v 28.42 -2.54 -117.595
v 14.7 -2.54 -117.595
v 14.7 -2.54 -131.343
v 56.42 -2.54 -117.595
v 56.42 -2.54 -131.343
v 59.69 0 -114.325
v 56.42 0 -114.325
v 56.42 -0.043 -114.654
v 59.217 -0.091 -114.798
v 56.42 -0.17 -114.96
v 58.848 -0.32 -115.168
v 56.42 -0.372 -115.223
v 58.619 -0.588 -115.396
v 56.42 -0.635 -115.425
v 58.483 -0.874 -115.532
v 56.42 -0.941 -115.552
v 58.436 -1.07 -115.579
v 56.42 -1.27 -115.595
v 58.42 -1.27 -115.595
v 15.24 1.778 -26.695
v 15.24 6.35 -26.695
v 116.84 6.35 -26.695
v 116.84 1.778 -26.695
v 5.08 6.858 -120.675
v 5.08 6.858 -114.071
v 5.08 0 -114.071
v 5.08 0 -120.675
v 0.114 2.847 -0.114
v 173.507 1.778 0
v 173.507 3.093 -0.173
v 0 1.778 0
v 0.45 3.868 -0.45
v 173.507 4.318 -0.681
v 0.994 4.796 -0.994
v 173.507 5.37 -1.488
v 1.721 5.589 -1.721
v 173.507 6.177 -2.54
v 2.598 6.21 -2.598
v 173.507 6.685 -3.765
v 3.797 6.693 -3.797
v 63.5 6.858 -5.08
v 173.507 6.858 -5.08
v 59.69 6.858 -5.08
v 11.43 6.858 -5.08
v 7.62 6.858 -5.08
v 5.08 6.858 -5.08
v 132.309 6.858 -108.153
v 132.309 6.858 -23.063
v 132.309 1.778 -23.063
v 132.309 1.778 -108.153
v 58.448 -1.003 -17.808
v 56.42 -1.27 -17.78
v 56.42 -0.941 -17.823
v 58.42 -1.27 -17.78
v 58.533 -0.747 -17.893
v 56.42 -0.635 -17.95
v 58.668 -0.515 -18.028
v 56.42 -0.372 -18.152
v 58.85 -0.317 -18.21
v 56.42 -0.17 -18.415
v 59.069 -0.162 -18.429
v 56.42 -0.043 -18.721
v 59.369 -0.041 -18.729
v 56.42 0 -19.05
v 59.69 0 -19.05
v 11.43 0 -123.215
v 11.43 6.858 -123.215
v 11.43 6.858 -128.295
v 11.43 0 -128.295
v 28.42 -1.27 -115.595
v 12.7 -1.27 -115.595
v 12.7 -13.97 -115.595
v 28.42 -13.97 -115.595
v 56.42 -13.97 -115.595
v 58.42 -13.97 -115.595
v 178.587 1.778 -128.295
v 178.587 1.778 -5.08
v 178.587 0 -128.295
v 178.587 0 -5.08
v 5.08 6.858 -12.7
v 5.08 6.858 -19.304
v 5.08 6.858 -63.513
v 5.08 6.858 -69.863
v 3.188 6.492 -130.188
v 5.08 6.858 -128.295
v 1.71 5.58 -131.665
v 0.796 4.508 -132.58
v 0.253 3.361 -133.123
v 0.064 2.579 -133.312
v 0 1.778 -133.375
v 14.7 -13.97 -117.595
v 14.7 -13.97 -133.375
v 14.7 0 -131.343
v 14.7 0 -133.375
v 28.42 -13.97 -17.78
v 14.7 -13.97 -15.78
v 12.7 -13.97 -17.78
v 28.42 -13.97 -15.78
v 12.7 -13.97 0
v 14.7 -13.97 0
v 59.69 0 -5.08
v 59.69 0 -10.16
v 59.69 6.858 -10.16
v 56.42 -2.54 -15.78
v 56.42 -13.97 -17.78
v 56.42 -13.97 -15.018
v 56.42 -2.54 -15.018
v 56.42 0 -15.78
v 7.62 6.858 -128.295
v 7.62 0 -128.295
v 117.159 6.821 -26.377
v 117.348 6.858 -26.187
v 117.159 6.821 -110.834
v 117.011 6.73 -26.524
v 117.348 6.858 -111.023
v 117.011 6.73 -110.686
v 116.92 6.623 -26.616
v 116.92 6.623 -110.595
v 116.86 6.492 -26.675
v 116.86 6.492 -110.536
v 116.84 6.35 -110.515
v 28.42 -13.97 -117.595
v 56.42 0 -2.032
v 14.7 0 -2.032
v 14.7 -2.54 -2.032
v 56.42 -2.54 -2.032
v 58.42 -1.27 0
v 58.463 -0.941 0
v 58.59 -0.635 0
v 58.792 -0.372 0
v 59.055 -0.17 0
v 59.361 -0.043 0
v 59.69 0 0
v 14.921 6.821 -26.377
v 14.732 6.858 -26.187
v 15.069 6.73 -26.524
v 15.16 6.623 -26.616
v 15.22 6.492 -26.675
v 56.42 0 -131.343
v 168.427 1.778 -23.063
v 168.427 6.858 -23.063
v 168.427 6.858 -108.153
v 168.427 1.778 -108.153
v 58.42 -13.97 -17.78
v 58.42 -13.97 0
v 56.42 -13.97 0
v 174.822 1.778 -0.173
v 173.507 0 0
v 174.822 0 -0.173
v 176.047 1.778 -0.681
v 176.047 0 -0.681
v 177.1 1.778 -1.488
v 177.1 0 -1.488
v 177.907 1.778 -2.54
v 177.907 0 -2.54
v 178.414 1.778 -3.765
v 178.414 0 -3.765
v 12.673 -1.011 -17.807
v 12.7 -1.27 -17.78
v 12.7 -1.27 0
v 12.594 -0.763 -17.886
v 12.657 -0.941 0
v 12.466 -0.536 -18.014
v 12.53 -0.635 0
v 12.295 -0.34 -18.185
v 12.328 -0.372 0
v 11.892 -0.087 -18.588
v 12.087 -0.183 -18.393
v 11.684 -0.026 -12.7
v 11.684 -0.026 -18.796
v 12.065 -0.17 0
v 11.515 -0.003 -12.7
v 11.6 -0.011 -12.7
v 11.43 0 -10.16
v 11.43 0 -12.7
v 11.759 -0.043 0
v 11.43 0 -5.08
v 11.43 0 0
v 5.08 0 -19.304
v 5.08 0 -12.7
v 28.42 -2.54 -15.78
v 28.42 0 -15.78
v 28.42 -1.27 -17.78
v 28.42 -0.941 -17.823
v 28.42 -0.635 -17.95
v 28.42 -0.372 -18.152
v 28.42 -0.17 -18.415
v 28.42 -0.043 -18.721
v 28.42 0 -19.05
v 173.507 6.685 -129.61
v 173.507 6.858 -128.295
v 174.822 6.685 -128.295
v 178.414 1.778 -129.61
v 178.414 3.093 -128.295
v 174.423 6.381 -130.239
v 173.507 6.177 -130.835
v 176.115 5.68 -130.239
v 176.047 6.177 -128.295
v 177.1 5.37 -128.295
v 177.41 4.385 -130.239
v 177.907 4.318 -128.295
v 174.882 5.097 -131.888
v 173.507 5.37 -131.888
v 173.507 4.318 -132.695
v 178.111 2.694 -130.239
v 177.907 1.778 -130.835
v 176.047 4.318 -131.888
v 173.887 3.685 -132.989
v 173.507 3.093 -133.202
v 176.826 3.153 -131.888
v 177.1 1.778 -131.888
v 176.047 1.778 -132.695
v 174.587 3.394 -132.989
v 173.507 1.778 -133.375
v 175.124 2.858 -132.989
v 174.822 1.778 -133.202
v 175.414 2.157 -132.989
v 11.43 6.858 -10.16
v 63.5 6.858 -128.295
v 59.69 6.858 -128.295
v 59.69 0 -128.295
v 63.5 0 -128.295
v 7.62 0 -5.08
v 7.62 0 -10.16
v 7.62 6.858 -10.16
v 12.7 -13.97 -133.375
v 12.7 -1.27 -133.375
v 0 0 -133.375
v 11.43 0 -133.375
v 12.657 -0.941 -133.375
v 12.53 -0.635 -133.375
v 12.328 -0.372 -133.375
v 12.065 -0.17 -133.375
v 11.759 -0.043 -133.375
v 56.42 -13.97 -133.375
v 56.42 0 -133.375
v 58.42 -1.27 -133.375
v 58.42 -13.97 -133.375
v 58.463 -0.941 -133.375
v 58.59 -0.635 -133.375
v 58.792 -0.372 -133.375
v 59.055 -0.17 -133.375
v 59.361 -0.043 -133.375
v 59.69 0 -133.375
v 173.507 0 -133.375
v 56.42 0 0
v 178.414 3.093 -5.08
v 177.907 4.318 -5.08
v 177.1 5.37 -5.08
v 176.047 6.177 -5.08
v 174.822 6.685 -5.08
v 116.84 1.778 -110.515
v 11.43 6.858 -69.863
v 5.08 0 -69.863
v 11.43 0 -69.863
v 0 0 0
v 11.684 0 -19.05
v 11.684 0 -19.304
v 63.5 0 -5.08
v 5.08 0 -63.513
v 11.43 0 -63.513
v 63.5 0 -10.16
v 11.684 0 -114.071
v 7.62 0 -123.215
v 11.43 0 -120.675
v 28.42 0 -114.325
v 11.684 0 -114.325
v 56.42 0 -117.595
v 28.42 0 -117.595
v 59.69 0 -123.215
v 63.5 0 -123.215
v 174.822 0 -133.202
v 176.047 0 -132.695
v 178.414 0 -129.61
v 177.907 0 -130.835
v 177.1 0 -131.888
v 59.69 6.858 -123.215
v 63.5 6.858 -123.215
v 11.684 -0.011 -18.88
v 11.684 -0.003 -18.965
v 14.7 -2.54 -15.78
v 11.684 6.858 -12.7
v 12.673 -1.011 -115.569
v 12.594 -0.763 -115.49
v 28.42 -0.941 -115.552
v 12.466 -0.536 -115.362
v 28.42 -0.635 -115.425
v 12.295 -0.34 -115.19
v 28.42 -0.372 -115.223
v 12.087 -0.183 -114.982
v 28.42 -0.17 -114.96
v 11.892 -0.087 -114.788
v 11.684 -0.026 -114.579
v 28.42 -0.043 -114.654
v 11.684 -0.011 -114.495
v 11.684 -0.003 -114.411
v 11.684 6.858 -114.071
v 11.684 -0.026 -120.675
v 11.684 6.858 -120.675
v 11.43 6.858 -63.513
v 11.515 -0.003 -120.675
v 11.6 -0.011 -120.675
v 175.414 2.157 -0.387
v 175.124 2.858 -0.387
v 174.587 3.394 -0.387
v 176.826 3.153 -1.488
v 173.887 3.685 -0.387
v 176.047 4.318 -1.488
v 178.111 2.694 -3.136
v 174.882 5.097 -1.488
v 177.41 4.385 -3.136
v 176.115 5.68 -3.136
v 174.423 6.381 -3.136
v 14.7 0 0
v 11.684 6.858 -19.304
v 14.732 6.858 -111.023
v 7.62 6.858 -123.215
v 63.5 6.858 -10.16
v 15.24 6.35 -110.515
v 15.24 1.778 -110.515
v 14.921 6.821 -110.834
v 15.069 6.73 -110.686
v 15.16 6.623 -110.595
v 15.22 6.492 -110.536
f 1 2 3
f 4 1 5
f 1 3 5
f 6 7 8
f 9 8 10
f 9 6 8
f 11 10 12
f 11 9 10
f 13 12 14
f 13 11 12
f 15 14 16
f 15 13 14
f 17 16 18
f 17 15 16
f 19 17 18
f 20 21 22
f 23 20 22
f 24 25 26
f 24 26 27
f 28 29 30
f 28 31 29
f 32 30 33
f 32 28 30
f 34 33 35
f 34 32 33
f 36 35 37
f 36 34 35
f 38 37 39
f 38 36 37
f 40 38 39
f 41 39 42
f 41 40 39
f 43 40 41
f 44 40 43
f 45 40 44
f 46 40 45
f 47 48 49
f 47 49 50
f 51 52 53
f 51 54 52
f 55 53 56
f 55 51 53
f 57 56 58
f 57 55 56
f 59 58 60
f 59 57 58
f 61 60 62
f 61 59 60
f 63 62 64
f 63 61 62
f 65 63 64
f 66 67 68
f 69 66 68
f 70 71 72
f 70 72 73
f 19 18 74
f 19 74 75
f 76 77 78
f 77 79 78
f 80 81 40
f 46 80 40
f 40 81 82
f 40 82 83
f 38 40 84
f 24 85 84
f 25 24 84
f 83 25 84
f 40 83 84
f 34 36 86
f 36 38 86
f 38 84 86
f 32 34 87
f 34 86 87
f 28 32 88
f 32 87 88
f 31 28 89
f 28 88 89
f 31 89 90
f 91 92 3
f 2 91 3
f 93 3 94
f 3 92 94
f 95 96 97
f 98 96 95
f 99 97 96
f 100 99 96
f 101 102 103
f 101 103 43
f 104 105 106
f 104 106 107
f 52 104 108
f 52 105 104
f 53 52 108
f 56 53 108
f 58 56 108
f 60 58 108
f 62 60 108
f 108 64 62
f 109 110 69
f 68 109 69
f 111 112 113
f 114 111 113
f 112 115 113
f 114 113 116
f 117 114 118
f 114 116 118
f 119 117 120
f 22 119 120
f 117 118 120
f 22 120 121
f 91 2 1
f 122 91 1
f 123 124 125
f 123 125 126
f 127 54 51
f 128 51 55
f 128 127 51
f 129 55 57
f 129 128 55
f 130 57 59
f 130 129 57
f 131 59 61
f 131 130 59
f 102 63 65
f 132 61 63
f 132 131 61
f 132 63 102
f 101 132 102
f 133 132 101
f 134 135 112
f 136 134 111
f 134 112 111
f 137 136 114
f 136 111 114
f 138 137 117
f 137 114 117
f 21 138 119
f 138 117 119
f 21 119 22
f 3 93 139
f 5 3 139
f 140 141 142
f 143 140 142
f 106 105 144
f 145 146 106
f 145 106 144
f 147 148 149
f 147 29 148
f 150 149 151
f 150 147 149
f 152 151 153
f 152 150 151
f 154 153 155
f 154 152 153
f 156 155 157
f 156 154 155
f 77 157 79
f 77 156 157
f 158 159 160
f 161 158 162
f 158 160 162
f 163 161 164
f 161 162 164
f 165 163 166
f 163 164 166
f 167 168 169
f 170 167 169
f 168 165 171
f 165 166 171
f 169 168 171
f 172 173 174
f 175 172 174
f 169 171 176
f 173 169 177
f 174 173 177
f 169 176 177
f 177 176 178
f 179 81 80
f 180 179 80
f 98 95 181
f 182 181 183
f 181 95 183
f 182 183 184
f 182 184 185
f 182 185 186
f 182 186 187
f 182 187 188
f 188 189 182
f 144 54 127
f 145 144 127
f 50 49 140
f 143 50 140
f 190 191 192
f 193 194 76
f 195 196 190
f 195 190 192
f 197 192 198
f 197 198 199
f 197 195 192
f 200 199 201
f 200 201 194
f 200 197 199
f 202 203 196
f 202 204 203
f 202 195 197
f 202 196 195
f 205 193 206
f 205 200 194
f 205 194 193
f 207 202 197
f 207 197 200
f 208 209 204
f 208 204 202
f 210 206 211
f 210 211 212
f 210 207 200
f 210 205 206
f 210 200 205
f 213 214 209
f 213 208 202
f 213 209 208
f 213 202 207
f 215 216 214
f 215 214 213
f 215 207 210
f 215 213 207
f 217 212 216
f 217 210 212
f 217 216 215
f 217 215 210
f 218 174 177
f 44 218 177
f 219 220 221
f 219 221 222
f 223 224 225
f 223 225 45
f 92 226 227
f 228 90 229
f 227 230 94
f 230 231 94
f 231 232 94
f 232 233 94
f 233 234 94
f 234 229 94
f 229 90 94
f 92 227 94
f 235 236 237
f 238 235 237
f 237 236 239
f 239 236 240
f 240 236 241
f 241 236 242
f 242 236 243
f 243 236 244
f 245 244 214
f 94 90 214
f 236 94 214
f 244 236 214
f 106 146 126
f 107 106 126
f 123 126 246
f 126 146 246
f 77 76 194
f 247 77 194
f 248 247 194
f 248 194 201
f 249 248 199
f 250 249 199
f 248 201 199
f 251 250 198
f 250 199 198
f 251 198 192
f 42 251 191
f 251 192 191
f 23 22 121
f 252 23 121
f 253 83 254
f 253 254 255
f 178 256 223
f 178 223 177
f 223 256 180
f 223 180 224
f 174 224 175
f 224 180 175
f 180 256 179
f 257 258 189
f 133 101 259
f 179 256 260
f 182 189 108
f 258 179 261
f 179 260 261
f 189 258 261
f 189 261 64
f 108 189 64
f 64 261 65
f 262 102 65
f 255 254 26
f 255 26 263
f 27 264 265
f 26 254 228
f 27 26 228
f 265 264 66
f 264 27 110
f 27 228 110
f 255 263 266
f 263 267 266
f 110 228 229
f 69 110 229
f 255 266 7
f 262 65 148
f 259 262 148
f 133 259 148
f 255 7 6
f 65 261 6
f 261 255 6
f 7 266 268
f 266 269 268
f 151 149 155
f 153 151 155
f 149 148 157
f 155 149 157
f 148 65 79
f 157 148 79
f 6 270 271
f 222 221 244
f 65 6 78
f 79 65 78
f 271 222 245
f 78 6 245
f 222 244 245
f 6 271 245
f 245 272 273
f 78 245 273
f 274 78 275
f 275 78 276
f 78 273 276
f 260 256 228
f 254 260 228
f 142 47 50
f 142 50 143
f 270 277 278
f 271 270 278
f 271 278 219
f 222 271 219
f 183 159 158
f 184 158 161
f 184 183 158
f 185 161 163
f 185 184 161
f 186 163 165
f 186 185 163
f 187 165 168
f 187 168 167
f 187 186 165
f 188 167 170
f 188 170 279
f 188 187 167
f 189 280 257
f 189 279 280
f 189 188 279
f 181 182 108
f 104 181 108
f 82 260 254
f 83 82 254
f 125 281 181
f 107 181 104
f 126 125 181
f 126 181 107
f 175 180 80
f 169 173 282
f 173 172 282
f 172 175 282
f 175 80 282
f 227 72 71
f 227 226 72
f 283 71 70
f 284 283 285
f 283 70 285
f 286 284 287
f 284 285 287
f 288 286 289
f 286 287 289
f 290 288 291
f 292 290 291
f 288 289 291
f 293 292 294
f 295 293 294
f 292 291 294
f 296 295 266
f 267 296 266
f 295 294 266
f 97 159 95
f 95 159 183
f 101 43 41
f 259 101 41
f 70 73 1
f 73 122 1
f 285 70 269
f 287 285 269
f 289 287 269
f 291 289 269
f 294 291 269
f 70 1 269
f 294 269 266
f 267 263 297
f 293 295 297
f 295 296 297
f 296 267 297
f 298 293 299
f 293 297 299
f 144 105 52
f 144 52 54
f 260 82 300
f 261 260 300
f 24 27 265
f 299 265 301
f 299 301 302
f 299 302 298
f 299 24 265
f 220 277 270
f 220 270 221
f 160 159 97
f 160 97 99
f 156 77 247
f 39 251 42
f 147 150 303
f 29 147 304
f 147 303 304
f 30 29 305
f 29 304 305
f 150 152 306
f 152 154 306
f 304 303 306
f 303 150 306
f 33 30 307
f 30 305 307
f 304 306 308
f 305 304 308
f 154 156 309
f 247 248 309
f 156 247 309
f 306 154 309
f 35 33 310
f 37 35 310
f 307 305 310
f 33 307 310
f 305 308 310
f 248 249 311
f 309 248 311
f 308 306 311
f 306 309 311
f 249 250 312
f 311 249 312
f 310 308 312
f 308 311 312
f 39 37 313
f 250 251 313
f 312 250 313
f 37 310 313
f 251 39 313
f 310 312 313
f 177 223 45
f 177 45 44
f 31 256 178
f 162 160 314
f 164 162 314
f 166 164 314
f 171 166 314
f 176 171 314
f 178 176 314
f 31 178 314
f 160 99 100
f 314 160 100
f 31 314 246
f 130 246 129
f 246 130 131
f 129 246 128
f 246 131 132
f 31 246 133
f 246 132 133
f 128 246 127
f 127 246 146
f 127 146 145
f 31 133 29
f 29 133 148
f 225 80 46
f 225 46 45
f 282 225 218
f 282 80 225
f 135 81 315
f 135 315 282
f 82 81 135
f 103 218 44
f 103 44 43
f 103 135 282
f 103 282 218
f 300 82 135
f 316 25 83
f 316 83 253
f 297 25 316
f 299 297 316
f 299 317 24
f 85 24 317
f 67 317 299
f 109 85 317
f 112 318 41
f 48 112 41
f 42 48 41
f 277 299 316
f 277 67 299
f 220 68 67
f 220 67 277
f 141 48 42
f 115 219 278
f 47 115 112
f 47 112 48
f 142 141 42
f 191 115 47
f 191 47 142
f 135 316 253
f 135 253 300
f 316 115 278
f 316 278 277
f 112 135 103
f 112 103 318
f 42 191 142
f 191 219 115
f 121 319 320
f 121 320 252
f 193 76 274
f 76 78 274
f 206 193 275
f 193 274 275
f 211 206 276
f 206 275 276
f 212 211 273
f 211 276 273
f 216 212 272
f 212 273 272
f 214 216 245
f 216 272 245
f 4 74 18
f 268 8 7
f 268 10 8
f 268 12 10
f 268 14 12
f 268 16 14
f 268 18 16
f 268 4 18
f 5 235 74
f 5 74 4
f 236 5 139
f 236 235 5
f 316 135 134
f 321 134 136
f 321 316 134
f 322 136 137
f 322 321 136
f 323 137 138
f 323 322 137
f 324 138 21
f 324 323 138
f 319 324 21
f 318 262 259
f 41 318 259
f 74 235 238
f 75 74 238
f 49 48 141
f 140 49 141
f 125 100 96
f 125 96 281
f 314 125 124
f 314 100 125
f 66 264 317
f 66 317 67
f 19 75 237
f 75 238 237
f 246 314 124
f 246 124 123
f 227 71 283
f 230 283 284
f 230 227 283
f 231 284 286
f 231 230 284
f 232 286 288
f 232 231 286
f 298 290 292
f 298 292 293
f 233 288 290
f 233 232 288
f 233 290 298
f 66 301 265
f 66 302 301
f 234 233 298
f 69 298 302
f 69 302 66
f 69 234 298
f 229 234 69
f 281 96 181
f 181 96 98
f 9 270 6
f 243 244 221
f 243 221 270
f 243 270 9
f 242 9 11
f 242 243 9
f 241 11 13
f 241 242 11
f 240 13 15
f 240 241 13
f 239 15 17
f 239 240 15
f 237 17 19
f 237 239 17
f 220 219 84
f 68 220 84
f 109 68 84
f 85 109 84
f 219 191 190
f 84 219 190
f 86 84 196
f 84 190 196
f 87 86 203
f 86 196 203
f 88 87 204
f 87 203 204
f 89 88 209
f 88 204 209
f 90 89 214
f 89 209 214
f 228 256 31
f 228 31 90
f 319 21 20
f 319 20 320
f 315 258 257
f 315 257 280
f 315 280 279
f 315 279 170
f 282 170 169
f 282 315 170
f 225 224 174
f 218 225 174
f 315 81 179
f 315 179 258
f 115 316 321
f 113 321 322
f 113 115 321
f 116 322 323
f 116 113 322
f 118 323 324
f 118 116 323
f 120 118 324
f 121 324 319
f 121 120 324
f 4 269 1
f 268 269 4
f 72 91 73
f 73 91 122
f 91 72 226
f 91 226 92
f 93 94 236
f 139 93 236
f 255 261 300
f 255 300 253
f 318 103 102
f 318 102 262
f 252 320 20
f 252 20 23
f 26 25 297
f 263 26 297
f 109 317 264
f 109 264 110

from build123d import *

# Parameters (mm, degrees)
SKETCH1_W             = 178.5874
SKETCH1_H             = 133.3754
BOSS_EXTRUDE1_DEPTH   = 6.858
FILLET1_R             = 5.08
FILLET2_R             = 5.08
SKETCH3_W             = 101.6
SKETCH3_H             = 83.82
CUT_EXTRUDE2_DEPTH    = 5.08
FILLET4_R             = 0.508
SKETCH5_W             = 45.72
SKETCH5_H             = 17.78
BOSS_EXTRUDE2_DEPTH   = 13.97
SKETCH7_W             = 41.720004
SKETCH7_H             = 13.78
CUT_EXTRUDE3_DEPTH    = 13.97
SKETCH9_W             = 21
SKETCH9_H             = 2.286
CUT_EXTRUDE4_DEPTH    = 2.762
SKETCH10_W            = 28
SKETCH10_H            = 13.97
CUT_EXTRUDE5_DEPTH    = 2.762
SKETCH11_W            = 41.720004
SKETCH11_H            = 13.78
BOSS_EXTRUDE3_DEPTH   = 2.54
MIRROR1_START         = -133.3754
MIRROR1_DEPTH         = 15.78
MIRROR1_2_DEPTH       = 2
MIRROR1_START_2       = -117.5954
MIRROR1_3_OUTLINE_W   = 15.720004
MIRROR1_3_OUTLINE_H   = 13.97
MIRROR1_3_OUTLINE_W_2 = 2
MIRROR1_3_DEPTH       = 2
SKETCH15_W            = 21
SKETCH15_H            = 11.684
CUT_EXTRUDE8_DEPTH    = 2.032
SKETCH17_W            = 20.720004
SKETCH17_H            = 13.97
CUT_EXTRUDE9_DEPTH    = 2.032
SKETCH22_W            = 6.35
SKETCH22_H            = 6.35
CUT_EXTRUDE12_DEPTH   = 7.62
FILLET6_R             = 1.27
FILLET7_R             = 1.27
SKETCH30_W            = 36.1188
SKETCH30_H            = 85.09
CUT_EXTRUDE14_DEPTH   = 5.08
SKETCH31_W            = 3.81
SKETCH31_H            = 5.08
CUT_EXTRUDE15_DEPTH   = 224.866617315
SKETCH32_W            = 3.81
SKETCH32_H            = 5.08
CUT_EXTRUDE16_DEPTH   = 224.866617315
SKETCH33_W            = 6.604
SKETCH33_H            = 6.604
CUT_EXTRUDE17_DEPTH   = 224.866617315


with BuildPart() as part:
    # Sketch1 → Boss-Extrude1 (new body)
    with BuildSketch(Plane(origin=(0, 0, 0), x_dir=(1, 0, 0), z_dir=(0, 1, 0))):
        with Locations((89.2937, 66.6877)):
            Rectangle(SKETCH1_W, SKETCH1_H)
    extrude(amount=BOSS_EXTRUDE1_DEPTH)

    # Fillet1
    fillet1_edges = [part.edges().sort_by_distance(p)[0] for p in [
        (178.5874, 6.858, -66.6877),
    ]]
    fillet(fillet1_edges, radius=FILLET1_R)

    # Fillet2
    fillet2_edges = [part.edges().sort_by_distance(p)[0] for p in [
        (86.7537, 6.858, -133.3754),
        (178.5874, 0.889, -133.3754),
        (177.099502448, 5.370102448, -133.3754),
        (178.5874, 0.889, 0),
        (177.099502448, 5.370102448, 0),
        (0, 6.858, -66.6877),
        (86.7537, 6.858, 0),
    ]]
    fillet(fillet2_edges, radius=FILLET2_R)

    # Sketch3 → Cut-Extrude2 (cut)
    with BuildSketch(Plane(origin=(0, 6.858, 0), x_dir=(1, 0, 0), z_dir=(0, 1, 0))):
        with Locations((66.04, 68.6054)):
            Rectangle(SKETCH3_W, SKETCH3_H)
    extrude(amount=-CUT_EXTRUDE2_DEPTH, mode=Mode.SUBTRACT)

    # Fillet4
    fillet4_edges = [part.edges().sort_by_distance(p)[0] for p in [
        (15.24, 6.858, -68.6054),
        (66.04, 6.858, -26.6954),
        (116.84, 6.858, -68.6054),
        (66.04, 6.858, -110.5154),
    ]]
    fillet(fillet4_edges, radius=FILLET4_R)

    # Sketch5 → Boss-Extrude2 (add)
    with BuildSketch(Plane.XZ):
        with Locations((35.56, -8.89)):
            Rectangle(SKETCH5_W, SKETCH5_H)
    extrude(amount=BOSS_EXTRUDE2_DEPTH)

    # Sketch7 → Cut-Extrude3 (cut)
    with BuildSketch(Plane.XZ.offset(13.97)):
        with Locations((35.559998, -8.89)):
            Rectangle(SKETCH7_W, SKETCH7_H)
    extrude(amount=-CUT_EXTRUDE3_DEPTH, mode=Mode.SUBTRACT)

    # Sketch9 → Cut-Extrude4 (cut)
    with BuildSketch(Plane.XY):
        with Locations((25.199996, -12.827)):
            Rectangle(SKETCH9_W, SKETCH9_H)
    extrude(amount=-CUT_EXTRUDE4_DEPTH, mode=Mode.SUBTRACT)

    # Sketch10 → Cut-Extrude5 (cut)
    with BuildSketch(Plane(origin=(0, 0, -17.78), x_dir=(-1, 0, 0), z_dir=(0, 0, -1))):
        with Locations((-42.420004, -6.985)):
            Rectangle(SKETCH10_W, SKETCH10_H)
    extrude(amount=-CUT_EXTRUDE5_DEPTH, mode=Mode.SUBTRACT)


with BuildPart() as boss_extrude3_tool:
    # Sketch11 → Boss-Extrude3 (new body)
    with BuildSketch(Plane.XZ):
        with Locations((35.559998, -8.89)):
            Rectangle(SKETCH11_W, SKETCH11_H)
    extrude(amount=BOSS_EXTRUDE3_DEPTH)


with BuildPart() as part_1:
    add(part.part)


with BuildPart() as part_2:
    # Boss-Extrude3: joined with boss_extrude3_tool
    add(part_1.part.fuse(boss_extrude3_tool.part, tol=0.00001))

    # Mirror1: read off the stored shape, not the designer's step
    # Mirror1 outline → Mirror1 (add)
    with BuildSketch(Plane.XY.offset(MIRROR1_START)):
        Polygon((12.7, -13.97), (14.699996, -13.97), (14.699996, -2.54), (56.42, -2.54), (56.42, -13.97), (58.42, -13.97), (58.42, 0), (12.7, 0), align=None)
    extrude(amount=MIRROR1_DEPTH)

    # Mirror1 2 outline → Mirror1 2 (add)
    with BuildSketch(Plane.XY.offset(MIRROR1_START)):
        Polygon((14.699996, -2.54), (14.699996, -11.684), (35.699996, -11.684), (35.699996, -13.97), (56.42, -13.97), (56.42, -2.54), align=None)
    extrude(amount=MIRROR1_2_DEPTH)

    # Mirror1 3 outline → Mirror1 3 (add)
    with BuildSketch(Plane.XY.offset(MIRROR1_START_2)):
        with Locations((20.560002, -6.985)):
            Rectangle(MIRROR1_3_OUTLINE_W, MIRROR1_3_OUTLINE_H)
        with Locations((57.42, -6.985)):
            Rectangle(MIRROR1_3_OUTLINE_W_2, MIRROR1_3_OUTLINE_H)
    extrude(amount=MIRROR1_3_DEPTH)

    # Sketch15 → Cut-Extrude8 (cut)
    with BuildSketch(Plane.XY):
        with Locations((25.199996, -5.842)):
            Rectangle(SKETCH15_W, SKETCH15_H)
    cut_extrude8 = extrude(amount=-CUT_EXTRUDE8_DEPTH, mode=Mode.SUBTRACT)

    # Sketch17 → Cut-Extrude9 (cut)
    with BuildSketch(Plane.XY):
        with Locations((46.059998, -6.985)):
            Rectangle(SKETCH17_W, SKETCH17_H)
    cut_extrude9 = extrude(amount=-CUT_EXTRUDE9_DEPTH, mode=Mode.SUBTRACT)

    # Mirror2: Cut-Extrude8, Cut-Extrude9 across plane
    add(cut_extrude8.mirror(Plane(origin=(0, 0, -66.6877), x_dir=(1, 0, 0), z_dir=(0, 0, -1))), mode=Mode.SUBTRACT)
    add(cut_extrude9.mirror(Plane(origin=(0, 0, -66.6877), x_dir=(1, 0, 0), z_dir=(0, 0, -1))), mode=Mode.SUBTRACT)

    # Sketch22 → Cut-Extrude12 (cut)
    with BuildSketch(Plane(origin=(0, 6.858, 0), x_dir=(1, 0, 0), z_dir=(0, 1, 0))):
        with Locations((8.255, 66.6877)):
            Rectangle(SKETCH22_W, SKETCH22_H)
    extrude(amount=-CUT_EXTRUDE12_DEPTH, mode=Mode.SUBTRACT)

    # Fillet6
    fillet6_edges = [part_2.edges().sort_by_distance(p)[0] for p in [
        (58.42, 0, -124.4854),
        (20.560002, 0, -115.5954),
        (12.7, 0, -124.4854),
        (57.42, 0, -115.5954),
    ]]
    fillet(fillet6_edges, radius=FILLET6_R)

    # Fillet7
    fillet7_edges = [part_2.edges().sort_by_distance(p)[0] for p in [
        (57.420002, 0, -17.78),
        (20.560002, 0, -17.78),
        (12.7, 0, -8.89),
        (58.42, 0, -8.89),
    ]]
    fillet(fillet7_edges, radius=FILLET7_R)

    # Sketch30 → Cut-Extrude14 (cut)
    with BuildSketch(Plane(origin=(0, 6.858, 0), x_dir=(1, 0, 0), z_dir=(0, 1, 0))):
        with Locations((150.368, 65.6082)):
            Rectangle(SKETCH30_W, SKETCH30_H)
    extrude(amount=-CUT_EXTRUDE14_DEPTH, mode=Mode.SUBTRACT)

    # Sketch31 → Cut-Extrude15 (cut, through all)
    with BuildSketch(Plane(origin=(0, 6.858, 0), x_dir=(1, 0, 0), z_dir=(0, 1, 0))):
        with Locations((9.525, 125.7554)):
            Rectangle(SKETCH31_W, SKETCH31_H)
    cut_extrude15 = extrude(amount=-CUT_EXTRUDE15_DEPTH, mode=Mode.SUBTRACT)

    # Sketch32 → Cut-Extrude16 (cut, through all)
    with BuildSketch(Plane(origin=(0, 6.858, 0), x_dir=(1, 0, 0), z_dir=(0, 1, 0))):
        with Locations((61.595, 125.7554)):
            Rectangle(SKETCH32_W, SKETCH32_H)
    cut_extrude16 = extrude(amount=-CUT_EXTRUDE16_DEPTH, mode=Mode.SUBTRACT)

    # Mirror3: Cut-Extrude15, Cut-Extrude16 across plane
    add(cut_extrude15.mirror(Plane(origin=(0, 0, -66.6877), x_dir=(1, 0, 0), z_dir=(0, 0, -1))), mode=Mode.SUBTRACT)
    add(cut_extrude16.mirror(Plane(origin=(0, 0, -66.6877), x_dir=(1, 0, 0), z_dir=(0, 0, -1))), mode=Mode.SUBTRACT)

    # Sketch33 → Cut-Extrude17 (cut, through all)
    with BuildSketch(Plane(origin=(0, 6.858, 0), x_dir=(1, 0, 0), z_dir=(0, 1, 0))):
        with Locations((8.382, 117.3734)):
            Rectangle(SKETCH33_W, SKETCH33_H)
    cut_extrude17 = extrude(amount=-CUT_EXTRUDE17_DEPTH, mode=Mode.SUBTRACT)

    # Mirror4: Cut-Extrude17 across plane
    add(cut_extrude17.mirror(Plane(origin=(0, 0, -66.6877), x_dir=(1, 0, 0), z_dir=(0, 0, -1))), mode=Mode.SUBTRACT)


solid = part_2.part
